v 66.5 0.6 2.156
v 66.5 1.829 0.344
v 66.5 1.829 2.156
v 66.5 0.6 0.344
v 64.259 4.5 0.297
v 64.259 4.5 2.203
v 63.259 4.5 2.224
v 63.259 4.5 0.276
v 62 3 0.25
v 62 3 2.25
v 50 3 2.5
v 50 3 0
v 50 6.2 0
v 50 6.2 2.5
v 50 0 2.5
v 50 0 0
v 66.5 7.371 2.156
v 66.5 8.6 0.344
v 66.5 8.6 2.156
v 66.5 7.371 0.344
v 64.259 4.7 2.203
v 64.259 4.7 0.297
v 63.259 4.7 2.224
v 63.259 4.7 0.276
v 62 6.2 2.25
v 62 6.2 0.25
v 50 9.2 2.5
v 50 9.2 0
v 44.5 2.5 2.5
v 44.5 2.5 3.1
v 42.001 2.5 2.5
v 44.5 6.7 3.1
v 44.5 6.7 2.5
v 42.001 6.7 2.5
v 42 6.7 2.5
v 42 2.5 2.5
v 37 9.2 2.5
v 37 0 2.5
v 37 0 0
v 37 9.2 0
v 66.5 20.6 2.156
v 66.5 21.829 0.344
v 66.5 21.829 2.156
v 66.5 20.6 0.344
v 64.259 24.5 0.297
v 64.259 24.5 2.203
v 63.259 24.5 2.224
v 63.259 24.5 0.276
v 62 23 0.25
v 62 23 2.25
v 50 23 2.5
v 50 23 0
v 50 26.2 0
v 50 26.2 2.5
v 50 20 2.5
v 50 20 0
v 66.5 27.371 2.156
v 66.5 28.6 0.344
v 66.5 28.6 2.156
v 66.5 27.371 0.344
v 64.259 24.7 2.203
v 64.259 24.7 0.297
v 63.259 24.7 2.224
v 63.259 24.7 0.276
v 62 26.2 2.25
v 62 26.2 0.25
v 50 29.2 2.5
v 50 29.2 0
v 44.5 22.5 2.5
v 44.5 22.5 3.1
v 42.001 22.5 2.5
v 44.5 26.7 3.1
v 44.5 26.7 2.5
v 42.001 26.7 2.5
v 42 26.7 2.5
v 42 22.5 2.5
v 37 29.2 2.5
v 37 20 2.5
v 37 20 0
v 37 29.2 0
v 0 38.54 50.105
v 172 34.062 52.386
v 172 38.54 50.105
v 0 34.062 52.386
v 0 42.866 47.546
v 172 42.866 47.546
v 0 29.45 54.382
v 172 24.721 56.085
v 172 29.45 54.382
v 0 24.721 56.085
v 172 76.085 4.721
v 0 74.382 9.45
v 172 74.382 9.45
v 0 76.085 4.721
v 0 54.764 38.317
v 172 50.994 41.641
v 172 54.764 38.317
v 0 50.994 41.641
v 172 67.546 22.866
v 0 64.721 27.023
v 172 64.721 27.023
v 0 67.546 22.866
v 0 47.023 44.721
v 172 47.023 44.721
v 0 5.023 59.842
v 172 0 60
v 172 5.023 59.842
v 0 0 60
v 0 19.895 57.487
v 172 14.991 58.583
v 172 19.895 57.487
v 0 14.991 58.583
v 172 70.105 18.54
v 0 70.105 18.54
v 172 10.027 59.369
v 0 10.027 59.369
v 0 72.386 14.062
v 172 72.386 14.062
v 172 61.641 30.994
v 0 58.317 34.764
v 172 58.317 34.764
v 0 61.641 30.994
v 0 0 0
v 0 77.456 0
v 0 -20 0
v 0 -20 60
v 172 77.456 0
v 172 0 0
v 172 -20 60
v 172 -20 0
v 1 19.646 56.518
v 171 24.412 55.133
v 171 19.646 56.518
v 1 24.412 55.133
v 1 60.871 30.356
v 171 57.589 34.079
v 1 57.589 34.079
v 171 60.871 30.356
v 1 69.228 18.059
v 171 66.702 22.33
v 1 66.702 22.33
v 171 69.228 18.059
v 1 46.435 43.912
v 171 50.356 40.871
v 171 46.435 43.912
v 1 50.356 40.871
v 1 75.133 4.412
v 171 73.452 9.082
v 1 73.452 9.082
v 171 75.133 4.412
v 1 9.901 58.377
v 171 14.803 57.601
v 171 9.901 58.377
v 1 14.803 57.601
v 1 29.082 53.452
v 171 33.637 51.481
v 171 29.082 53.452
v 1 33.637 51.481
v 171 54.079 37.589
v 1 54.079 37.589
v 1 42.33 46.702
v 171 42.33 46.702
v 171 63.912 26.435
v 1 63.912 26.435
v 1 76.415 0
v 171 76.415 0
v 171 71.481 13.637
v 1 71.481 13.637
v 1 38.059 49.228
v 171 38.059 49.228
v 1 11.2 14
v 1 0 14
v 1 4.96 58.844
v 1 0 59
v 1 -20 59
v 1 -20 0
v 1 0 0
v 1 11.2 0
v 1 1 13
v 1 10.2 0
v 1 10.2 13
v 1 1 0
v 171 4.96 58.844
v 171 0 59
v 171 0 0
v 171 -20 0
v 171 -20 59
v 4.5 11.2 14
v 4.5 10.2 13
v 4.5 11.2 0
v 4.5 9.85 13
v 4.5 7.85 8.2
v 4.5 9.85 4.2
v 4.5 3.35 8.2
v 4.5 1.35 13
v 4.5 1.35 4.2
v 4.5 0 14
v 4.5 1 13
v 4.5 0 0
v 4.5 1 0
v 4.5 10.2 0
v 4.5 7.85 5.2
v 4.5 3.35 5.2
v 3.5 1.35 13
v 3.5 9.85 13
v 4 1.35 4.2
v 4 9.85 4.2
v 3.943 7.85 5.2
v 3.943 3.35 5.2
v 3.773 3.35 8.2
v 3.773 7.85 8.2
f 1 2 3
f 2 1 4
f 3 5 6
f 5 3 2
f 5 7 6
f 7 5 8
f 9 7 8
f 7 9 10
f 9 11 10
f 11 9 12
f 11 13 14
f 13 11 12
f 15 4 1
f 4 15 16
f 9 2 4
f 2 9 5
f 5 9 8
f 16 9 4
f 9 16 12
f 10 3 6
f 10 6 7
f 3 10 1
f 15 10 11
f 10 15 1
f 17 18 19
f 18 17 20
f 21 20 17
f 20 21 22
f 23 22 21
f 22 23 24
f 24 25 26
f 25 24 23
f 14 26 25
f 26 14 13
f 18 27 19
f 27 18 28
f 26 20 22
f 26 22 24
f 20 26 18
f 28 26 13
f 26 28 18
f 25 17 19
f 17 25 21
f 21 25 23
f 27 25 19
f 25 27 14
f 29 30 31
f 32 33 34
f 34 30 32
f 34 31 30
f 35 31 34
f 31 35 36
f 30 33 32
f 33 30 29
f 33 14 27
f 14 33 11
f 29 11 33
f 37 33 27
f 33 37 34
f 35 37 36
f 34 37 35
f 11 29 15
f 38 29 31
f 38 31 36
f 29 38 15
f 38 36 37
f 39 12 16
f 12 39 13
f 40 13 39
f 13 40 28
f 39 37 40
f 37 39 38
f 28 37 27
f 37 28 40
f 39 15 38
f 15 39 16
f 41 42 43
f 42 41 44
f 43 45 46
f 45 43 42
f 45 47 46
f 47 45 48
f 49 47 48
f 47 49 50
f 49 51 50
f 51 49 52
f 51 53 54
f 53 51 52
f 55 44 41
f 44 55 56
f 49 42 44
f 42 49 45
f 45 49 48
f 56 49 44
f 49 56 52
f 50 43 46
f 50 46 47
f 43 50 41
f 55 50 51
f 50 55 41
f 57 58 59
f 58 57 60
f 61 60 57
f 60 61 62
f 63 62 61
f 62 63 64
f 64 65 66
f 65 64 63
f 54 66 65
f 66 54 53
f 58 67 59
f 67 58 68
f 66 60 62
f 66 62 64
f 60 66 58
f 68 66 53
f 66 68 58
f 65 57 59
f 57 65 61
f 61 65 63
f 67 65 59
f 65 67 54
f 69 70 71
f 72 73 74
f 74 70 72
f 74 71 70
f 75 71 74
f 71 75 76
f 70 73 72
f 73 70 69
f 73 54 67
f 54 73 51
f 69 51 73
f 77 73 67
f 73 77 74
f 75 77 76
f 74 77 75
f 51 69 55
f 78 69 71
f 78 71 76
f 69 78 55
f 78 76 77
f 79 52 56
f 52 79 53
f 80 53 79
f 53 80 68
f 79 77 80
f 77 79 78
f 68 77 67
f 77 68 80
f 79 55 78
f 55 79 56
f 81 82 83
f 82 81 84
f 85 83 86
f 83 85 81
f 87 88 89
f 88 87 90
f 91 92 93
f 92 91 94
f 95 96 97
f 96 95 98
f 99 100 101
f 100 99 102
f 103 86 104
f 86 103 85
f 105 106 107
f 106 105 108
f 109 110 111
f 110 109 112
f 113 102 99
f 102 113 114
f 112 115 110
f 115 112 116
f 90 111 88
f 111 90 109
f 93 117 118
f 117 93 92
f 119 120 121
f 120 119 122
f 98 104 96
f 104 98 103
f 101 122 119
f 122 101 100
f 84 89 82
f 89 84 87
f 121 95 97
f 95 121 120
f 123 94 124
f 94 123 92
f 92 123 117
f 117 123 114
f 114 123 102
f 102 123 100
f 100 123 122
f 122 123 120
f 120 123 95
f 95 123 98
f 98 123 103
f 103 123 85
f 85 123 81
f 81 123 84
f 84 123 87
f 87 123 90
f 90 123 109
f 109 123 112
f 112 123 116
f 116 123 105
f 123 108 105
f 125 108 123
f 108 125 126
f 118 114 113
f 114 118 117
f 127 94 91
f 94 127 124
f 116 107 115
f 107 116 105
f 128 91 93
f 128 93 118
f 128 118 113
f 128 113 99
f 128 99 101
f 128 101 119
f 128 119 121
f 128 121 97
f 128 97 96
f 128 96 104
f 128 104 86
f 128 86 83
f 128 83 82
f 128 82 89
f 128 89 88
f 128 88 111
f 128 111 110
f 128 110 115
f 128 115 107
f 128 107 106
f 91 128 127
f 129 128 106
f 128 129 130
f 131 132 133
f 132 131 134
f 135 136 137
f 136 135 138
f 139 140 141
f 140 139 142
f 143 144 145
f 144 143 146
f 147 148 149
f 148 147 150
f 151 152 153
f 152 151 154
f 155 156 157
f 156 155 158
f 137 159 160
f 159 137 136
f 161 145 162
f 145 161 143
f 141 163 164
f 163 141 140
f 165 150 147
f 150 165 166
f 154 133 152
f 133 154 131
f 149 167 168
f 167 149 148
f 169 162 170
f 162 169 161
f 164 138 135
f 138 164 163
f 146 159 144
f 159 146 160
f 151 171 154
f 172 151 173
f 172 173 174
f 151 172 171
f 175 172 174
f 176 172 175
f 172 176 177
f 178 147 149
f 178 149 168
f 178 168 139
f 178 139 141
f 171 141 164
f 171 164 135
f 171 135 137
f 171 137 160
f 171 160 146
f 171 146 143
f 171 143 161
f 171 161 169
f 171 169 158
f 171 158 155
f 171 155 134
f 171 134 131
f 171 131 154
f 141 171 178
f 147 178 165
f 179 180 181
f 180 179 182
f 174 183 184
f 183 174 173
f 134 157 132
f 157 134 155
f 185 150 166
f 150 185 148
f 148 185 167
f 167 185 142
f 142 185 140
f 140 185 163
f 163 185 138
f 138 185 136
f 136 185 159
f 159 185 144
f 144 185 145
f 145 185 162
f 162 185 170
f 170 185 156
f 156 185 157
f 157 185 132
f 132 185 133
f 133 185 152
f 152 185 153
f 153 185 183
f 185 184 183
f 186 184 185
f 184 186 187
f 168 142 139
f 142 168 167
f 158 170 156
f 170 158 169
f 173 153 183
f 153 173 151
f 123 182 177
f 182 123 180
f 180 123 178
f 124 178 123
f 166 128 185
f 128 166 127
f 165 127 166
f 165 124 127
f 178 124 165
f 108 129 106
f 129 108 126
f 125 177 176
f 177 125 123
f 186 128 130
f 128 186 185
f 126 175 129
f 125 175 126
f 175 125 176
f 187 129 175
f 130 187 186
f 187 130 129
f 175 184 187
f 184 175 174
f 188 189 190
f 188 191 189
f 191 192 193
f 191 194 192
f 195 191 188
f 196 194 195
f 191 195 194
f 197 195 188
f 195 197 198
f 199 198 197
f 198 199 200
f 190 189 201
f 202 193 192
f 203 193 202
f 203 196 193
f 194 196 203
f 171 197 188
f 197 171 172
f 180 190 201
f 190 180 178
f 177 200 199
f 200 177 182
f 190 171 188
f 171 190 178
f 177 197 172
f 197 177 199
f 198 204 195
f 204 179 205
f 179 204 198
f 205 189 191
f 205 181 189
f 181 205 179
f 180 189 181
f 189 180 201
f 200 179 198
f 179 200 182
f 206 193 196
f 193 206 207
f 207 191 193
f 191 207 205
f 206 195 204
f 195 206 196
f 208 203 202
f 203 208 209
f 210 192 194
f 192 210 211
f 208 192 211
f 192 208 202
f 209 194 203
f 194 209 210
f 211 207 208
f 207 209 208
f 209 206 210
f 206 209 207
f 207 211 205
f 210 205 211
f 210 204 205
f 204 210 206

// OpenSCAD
// file: fillet.scad
module fillet(l=2, r=2, a=90, center=true, v=[1,1,0], p=[0,0,0])
{
    
    v_norm=[ v[0], -v[1], -v[2] ]/sqrt(v*v); //corrected axis of v and normalised
    rotation_vector=(v[1]==0 && v[2]==0) ? [0,0,1] : cross(v_norm, [1,0,0]); //takes into account edge case of parallel start and finish vectors resulting in zero vector for cross product
    rotation_angle=acos(v_norm*[1,0,0]);
    
    translate(p)
    rotate(a=rotation_angle, v=rotation_vector)
    translate([0, 0, center ? -l/2 : 0])
    rotate([0,0,-a/2])
    difference()
    {
        
        x2=r/tan(a/2);
        x1=x2*cos(a);
        y1=x2*sin(a);
        
        linear_extrude(l)
        polygon([ [0,0], [x2,0], [x1,y1] ]);
        
        translate([x2, r, -1])
        cylinder(r=r, h=l+2);
        
    }
    
}

//fillet($fn=50);


// l = longitudal length of the chamfer
// d = distance of the chamfer
// a = interior angle of the chamfer
// center = whether the chamfer is centered on the origin
// edge = the angle of the chamfer to the horizontal (x-y plane)
// v = a vector normal to the face of the chamfer
// p = the position of the chamfer
module chamfer(l=2, d=2, a=90, center=true, edge=0, v=[1,1,0], p=[0,0,0])
{
    
    x1=d*cos(a);
    y1=d*sin(a);
    
    v_norm=[ v[0], -v[1], -v[2] ]/sqrt(v*v); //corrected axis of v and normalised
    rotation_vector=(v[1]==0 && v[2]==0) ? [0,0,1] : cross(v_norm, [1,0,0]); //takes into account edge case of parallel start and finish vectors resulting in zero vector for cross product
    rotation_angle=acos(v_norm*[1,0,0]);
    
    translate(p)
    rotate(a=rotation_angle, v=rotation_vector)
    rotate([edge,0,0])
    translate([0, 0, center ? -l/2 : 0])
    rotate([0,0,-a/2])
    linear_extrude(l)
    polygon([ [0,0], [d,0], [x1,y1] ]);
    
}

//chamfer();
// file: snap_fit.scad
module hook (a1=1, a2=1, a3=2.5, a4=50, a5=50, b1=2, b2=5.5, b3=1.4, b4=2.5, b5=2)
{
    
    //total_length=b2 + a2/tan(a4) + a1 + a2/tan(a5);
    total_length=b2 + a3;
    echo(str("Hook Total Length is: ", total_length, "mm"));
    
    end_width=b4 - 2*(((b4 - b5)/2 / b2) * total_length);
    echo(str("Hook End Width is: ", end_width, "mm"));
    
    beam_taper=atan(((b4-end_width)/2) / total_length);
    echo(str("Hook Beam X Taper is: ", beam_taper, " degrees"));
    
//    translate([0, -b1/2, -b4/2]) //use to centre on origin
    difference()
    {
        
        linear_extrude(b4, convexity=2)
        polygon([   [0, 0], 
                    [0, b1], 
                    [b2, b1], 
                    [b2 + a2/tan(a4), b1 + a2], 
                    [b2 + a2/tan(a4) + a1, b1 + a2],
                    [total_length, b1 + a2 - tan(a5)*(a3 - a1 - a2/tan(a4))],
                    [total_length, b1 - b3] 
                ]);        
        
        rotate([0, -beam_taper, 0])
        translate([0, -1, -1.5*b4])
        cube([1.5*total_length, b1 + a2 + 2, 1.5*b4]);
        
        mirror([0,0,1])
        translate([0,0,-b4])
        rotate([0, -beam_taper, 0])
        translate([0, -1, -1.5*b4])
        cube([1.5*total_length, b1 + a2 + 2, 1.5*b4]);
        
    }
    
}

//hook();

module loop (c1=3, c2=5, c3=2, c4=1, d1=0.5, d2=1.5, d3=0.5, d4=0.5)
{
    
    clip_taper=atan((c3 - c4)/c2);
    echo(str("Clip Taper is: ", clip_taper, " degrees"));
    
//    translate([0, -c1/2, -c3/2]) //use to centre on origin
    difference()
    {
        
        cube([c2, c1, c3]);
        
        translate([c2 - d4 - d2, d3, -1])
        cube([d2, c1 - d1 - d3, c3 + 2]);
        
        rotate([0, -clip_taper, 0])
        translate([0, -1, -c3])
        cube([1.5*c2, c1 + 2, c3]);
        
    }
    
}

//loop();
// main file
//non-modular quick print

//whole vent 15-20 from horizontal
// individual vents 45-50 from horizontal

use <snap_fit.scad>
use <fillet.scad>

$fn=100;
wall_thickness=1;

clips=true;
duct=true;

if(clips)
{
    translate([50,0,0])
    clip();

    translate([50,20,0])
    clip();
}


if(duct)
{
    //rotate([-20, 0, 0])
    //rotate([20, 0, 0])
    union()
    {
        difference()
        {
            translate([0,0,-20])
            difference()
            {
                
                rotate([0, 90, 0])
                cylinder(r=80, h=172);
                
                translate([wall_thickness, 0, 0])
                rotate([0, 90, 0])
                cylinder(r=80 - wall_thickness, h=172 - 2*wall_thickness);
                
                translate([-499, -80, -499])
                cube([999, 80, 999]);
                
                translate([-499, -499, -81])
                cube([999, 999, 81]);
                
            }
            translate([-499, -499, -21])
            cube([999, 999, 21]);
        }
        
        difference()
        {
            translate([0, -20, 0])
            cube([172, 20, 60]);
            
            translate([wall_thickness, -21, -1])
            cube([172 - 2*wall_thickness, 21 + 0.01, 60 - wall_thickness + 1]);
        }
    }
}


translate([wall_thickness,0,0])
catch();


module catch()
{
    
    difference()
    {
        cube([2.5, 9.2, 13] + wall_thickness*[1,2,1]);
        
        translate([-1, wall_thickness, -1])
        cube([2.5 + wall_thickness + 2, 9.2, 13 + 1]);
    }
    
    translate([2.5, wall_thickness + (9.2 - 8.5)/2, 13])
    rotate([0,90,0])
    loop(c1=8.5, c2=5+2.8+1, c3=wall_thickness, c4=wall_thickness/2, d1=2, d2=3, d3=2, d4=1);
    
}

module clip()
{
    union()
    {
        
        hook(a2=1.5, a3=4.5, b2=12, b1=3, b3=2.4);
        
        translate([0,9.2,0])
        mirror([0,1,0])
        hook(a2=1.5, a3=4.5, b2=12, b1=3, b3=2.4);
        
        translate([0,2.5,0])
        rotate([90,0,180])
        #hook(b4=4.2, b1=2.5, b5=4.2, b3=2.5, a1=0, a4=90, a5=13.5, a2=0.6, a3=2.5);
        
        translate([-13,0,0])
        #cube([5,9.2,2.5]);
        translate([-8,0,0])
        cube([8,2.5,2.5]);
        translate([-8,6.7,0])
        cube([8,2.5,2.5]);
        
    }
}
